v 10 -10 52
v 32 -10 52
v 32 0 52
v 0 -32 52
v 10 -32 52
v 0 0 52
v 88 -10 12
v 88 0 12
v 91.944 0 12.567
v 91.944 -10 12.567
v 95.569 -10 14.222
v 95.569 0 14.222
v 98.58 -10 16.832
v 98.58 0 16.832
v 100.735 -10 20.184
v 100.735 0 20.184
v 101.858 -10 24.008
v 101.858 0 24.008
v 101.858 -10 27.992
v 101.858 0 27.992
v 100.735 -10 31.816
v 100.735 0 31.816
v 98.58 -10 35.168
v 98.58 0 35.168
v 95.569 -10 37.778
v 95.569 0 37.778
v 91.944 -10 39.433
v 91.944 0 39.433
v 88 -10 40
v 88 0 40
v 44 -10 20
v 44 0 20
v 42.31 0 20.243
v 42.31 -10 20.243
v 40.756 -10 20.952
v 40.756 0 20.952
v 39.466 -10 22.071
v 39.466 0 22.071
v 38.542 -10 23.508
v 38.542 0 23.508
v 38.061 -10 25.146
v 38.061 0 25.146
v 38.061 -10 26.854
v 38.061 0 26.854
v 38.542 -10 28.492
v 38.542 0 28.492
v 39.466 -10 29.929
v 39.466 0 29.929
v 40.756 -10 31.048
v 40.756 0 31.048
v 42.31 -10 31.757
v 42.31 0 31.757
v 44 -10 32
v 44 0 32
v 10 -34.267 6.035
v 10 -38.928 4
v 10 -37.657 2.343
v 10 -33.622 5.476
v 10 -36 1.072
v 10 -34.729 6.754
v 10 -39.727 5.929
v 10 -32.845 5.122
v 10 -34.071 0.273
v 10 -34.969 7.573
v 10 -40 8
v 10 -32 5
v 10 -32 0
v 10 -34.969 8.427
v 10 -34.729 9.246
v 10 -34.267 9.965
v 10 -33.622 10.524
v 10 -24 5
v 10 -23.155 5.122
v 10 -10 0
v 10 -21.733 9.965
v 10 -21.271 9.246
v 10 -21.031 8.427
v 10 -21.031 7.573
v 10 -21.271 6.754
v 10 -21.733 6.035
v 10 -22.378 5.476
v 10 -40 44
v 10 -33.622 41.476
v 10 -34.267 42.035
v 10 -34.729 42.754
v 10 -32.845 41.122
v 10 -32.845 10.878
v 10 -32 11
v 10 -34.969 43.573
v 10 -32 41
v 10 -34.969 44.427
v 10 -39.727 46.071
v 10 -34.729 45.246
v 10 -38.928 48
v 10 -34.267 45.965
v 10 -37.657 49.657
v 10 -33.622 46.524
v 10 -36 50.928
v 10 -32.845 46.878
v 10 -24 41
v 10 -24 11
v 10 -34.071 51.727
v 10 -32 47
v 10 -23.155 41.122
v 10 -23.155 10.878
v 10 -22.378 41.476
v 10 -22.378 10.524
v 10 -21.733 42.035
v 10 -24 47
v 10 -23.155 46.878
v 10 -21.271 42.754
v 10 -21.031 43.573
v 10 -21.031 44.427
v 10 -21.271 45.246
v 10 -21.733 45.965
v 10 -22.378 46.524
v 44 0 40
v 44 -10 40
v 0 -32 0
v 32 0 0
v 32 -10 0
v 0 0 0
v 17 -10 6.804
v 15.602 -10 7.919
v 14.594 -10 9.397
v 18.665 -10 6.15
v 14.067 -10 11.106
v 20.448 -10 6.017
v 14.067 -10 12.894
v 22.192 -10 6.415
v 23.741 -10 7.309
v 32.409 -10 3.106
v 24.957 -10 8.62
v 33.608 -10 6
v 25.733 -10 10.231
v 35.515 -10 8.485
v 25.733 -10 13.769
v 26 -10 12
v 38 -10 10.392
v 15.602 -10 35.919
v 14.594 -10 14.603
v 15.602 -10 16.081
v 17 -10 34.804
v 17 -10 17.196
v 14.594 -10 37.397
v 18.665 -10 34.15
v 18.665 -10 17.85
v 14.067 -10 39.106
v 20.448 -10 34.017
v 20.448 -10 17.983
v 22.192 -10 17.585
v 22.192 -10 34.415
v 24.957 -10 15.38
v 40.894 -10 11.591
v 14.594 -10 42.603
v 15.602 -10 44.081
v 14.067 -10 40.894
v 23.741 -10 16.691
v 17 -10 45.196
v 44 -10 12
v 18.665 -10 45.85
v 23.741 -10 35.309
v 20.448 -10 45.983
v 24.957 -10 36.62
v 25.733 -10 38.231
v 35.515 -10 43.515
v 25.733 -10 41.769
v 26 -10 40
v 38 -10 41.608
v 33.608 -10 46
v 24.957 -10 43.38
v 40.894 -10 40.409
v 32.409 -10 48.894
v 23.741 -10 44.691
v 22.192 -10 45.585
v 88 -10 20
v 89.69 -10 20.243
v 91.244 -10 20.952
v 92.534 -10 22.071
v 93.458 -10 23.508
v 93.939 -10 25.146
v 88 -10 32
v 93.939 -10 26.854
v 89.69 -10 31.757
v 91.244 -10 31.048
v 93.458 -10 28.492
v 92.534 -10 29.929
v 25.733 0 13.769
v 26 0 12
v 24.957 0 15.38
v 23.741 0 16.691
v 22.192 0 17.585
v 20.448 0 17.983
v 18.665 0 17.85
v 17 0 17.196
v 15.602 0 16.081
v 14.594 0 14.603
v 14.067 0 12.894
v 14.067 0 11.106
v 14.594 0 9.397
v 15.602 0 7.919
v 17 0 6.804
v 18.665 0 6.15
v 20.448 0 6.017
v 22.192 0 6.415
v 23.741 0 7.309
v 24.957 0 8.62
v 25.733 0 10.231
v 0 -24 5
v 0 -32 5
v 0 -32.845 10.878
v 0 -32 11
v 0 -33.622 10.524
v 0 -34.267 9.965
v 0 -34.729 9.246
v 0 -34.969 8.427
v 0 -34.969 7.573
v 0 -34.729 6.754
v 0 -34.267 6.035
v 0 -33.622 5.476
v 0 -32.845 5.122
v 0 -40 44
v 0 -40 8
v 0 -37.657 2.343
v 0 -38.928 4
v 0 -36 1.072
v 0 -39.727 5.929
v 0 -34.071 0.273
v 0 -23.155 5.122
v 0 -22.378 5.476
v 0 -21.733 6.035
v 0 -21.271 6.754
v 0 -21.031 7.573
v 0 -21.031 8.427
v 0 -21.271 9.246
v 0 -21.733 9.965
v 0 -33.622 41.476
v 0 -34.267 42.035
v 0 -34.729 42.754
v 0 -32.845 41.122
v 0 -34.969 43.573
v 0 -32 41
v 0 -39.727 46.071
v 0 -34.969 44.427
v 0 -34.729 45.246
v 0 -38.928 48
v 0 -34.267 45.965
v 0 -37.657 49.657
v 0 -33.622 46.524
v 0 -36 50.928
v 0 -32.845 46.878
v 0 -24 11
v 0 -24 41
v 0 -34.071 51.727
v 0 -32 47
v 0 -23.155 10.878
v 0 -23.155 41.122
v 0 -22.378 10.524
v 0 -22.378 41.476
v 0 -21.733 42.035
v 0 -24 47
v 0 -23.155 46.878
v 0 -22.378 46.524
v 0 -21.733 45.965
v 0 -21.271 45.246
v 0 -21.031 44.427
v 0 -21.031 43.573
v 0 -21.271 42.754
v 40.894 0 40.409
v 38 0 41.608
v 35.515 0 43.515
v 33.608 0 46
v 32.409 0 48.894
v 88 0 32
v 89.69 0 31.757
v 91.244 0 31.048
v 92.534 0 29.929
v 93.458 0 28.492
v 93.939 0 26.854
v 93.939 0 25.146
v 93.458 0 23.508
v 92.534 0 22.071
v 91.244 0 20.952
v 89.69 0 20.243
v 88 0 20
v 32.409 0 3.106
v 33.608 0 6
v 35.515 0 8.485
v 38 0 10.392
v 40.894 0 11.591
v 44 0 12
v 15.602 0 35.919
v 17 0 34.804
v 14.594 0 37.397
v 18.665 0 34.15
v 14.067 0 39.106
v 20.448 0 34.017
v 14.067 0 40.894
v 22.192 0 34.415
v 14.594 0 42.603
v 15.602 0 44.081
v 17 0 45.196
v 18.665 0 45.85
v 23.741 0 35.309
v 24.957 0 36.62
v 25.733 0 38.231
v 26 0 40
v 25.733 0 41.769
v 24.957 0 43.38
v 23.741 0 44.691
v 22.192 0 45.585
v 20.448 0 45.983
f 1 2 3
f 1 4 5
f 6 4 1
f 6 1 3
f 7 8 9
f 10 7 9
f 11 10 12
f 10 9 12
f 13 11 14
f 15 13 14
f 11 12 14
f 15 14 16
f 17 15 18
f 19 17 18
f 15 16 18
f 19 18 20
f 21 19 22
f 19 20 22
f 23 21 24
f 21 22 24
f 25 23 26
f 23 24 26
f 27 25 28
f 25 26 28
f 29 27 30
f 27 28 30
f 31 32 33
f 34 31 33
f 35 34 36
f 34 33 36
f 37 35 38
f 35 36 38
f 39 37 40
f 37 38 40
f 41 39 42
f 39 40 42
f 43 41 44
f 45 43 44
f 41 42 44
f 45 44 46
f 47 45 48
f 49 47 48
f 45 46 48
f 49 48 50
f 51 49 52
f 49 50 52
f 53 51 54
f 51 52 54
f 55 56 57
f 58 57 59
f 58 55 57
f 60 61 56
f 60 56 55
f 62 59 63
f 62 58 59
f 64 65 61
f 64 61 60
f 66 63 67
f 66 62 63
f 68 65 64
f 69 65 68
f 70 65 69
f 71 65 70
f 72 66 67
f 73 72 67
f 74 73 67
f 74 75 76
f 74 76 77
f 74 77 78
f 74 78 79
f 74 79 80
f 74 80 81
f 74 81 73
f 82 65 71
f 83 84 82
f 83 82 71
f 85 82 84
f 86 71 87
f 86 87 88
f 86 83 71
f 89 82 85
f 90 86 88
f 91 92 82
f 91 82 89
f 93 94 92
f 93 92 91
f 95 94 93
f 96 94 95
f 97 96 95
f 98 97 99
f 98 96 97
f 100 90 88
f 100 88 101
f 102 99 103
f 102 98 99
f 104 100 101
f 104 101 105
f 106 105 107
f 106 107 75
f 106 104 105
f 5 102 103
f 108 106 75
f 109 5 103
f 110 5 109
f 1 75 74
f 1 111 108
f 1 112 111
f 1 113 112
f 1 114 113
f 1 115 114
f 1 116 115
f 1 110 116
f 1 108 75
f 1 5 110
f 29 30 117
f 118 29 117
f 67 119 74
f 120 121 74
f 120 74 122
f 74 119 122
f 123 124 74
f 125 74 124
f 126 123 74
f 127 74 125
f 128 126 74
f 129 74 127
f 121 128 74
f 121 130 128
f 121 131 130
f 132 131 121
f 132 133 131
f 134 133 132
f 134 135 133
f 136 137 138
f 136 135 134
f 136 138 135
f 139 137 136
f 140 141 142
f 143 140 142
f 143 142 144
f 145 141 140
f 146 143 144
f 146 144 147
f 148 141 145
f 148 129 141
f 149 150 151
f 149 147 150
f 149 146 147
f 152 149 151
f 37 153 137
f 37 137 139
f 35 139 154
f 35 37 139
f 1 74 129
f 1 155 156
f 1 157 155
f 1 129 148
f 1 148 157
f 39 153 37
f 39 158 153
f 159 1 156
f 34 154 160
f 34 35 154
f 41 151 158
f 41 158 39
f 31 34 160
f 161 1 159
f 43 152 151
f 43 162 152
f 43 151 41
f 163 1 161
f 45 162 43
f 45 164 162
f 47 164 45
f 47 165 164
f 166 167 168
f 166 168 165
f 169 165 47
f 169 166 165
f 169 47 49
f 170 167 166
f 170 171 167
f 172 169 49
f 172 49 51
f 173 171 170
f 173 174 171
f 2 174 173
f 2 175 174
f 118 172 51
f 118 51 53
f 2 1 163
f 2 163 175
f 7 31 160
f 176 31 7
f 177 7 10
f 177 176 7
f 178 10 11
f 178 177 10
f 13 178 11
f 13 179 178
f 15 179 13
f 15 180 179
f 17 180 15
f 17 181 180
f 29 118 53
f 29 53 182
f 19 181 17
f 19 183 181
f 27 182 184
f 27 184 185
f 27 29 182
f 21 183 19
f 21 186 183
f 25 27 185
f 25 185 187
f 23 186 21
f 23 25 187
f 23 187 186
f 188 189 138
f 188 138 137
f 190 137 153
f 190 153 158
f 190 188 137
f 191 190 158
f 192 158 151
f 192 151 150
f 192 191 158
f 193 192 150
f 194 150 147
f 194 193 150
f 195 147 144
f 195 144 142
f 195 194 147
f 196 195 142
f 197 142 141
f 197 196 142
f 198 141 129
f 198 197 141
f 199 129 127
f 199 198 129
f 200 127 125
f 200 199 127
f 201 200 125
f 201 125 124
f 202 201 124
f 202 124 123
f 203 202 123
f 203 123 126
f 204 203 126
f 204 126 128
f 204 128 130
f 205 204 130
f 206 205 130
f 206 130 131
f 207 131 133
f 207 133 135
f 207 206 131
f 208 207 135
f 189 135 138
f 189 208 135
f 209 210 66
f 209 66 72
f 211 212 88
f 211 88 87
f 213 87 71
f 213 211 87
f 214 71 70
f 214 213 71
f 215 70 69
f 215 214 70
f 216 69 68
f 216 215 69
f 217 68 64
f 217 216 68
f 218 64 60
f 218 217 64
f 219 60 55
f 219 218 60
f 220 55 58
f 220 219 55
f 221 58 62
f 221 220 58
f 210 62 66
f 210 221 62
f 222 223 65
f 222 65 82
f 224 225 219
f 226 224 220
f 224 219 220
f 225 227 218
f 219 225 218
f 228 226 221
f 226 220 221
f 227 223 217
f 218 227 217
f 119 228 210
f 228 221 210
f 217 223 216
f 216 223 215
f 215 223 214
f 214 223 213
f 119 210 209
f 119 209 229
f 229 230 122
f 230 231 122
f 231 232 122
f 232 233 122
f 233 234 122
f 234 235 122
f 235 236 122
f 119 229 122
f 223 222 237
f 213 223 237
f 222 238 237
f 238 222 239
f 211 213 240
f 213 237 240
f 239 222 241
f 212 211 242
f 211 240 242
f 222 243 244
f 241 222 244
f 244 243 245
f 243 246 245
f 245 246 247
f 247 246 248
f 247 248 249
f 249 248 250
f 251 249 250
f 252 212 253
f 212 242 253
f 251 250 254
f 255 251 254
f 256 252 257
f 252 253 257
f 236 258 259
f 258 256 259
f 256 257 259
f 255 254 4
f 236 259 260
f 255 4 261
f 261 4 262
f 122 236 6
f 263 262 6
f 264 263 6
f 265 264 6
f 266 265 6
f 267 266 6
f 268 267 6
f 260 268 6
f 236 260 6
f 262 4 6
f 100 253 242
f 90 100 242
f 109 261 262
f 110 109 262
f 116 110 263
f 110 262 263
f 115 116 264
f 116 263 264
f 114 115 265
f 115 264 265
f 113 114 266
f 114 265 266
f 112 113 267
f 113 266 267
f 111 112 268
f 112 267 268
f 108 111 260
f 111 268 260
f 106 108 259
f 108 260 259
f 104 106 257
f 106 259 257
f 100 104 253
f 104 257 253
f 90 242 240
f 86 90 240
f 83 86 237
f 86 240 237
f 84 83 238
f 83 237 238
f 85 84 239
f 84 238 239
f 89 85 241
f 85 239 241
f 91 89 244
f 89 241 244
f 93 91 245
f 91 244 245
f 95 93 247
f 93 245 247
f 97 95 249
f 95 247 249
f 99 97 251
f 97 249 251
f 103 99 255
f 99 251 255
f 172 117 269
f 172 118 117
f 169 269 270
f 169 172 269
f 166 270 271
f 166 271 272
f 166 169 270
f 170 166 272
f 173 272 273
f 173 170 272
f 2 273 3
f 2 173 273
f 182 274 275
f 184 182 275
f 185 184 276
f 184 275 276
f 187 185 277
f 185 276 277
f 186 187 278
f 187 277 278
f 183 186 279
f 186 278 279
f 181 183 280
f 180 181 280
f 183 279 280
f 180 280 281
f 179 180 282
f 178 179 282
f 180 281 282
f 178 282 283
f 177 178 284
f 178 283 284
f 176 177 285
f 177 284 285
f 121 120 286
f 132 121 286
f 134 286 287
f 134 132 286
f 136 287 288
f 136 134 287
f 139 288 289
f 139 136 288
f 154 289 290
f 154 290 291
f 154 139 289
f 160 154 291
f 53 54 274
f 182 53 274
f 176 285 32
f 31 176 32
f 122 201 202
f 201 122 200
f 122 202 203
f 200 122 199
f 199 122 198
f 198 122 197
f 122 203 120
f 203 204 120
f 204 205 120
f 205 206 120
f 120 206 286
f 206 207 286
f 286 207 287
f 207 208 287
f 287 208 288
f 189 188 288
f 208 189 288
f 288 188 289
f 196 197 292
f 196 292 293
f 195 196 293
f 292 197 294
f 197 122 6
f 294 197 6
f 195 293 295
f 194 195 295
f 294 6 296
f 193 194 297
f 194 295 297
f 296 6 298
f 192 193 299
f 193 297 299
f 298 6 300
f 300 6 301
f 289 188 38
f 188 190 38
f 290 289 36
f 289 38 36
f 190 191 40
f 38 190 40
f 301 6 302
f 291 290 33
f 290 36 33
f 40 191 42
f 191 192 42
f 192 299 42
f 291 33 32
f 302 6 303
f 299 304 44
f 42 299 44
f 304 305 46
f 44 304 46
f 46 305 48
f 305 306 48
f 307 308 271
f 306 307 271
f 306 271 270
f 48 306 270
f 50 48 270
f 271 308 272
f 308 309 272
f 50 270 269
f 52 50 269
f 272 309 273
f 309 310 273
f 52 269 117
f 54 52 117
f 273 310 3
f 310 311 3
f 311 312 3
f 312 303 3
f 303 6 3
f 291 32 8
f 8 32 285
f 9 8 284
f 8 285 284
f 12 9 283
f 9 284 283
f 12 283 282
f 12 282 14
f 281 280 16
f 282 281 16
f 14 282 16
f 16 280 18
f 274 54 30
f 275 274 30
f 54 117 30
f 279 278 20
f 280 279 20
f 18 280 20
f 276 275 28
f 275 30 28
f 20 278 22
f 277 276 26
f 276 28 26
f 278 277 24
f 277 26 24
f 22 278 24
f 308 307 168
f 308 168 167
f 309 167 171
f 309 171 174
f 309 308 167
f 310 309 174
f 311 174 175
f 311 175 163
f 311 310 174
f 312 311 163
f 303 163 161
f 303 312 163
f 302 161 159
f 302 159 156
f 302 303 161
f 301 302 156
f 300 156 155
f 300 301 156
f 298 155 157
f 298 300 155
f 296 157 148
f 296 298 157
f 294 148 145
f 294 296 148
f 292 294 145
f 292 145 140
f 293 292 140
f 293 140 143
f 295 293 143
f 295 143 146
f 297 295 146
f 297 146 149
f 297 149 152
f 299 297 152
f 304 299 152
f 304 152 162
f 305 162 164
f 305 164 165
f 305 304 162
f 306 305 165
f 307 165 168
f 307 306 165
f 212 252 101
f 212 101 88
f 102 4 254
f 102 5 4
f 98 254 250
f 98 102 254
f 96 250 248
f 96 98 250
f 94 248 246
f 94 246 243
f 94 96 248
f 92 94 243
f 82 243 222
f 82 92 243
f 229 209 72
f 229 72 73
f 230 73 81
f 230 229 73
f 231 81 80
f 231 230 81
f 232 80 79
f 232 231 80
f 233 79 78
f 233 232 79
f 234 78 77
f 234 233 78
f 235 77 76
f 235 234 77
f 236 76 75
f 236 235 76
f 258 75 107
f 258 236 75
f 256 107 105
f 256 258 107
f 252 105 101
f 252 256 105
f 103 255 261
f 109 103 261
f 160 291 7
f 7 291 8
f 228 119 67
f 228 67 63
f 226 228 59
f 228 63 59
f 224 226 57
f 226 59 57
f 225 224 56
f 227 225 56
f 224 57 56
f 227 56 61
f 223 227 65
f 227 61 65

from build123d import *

# Parameters (mm, degrees)
F0_R     = 6
F1_DEPTH = 10
F2_W     = 40
F2_H     = 52
F3_DEPTH = 10
F4_R     = 11.99999
F5_R     = 8
F7_DEPTH = 102.001


# Not quite as in the source:
# - a fillet or chamfer is up to 0.001 mm smaller than in the source, because OpenCascade refuses the exact size


with BuildPart() as f1:
    # F0 (on Front) → F1 (new body)
    with BuildSketch(Plane.XZ):
        with BuildLine():
            Line((32, 52), (0, 52))
            Line((0, 52), (0, 0))
            Line((0, 0), (32, 0))
            Line((32, 0), (32, 12))
            Line((32, 12), (88, 12))
            ThreePointArc((88, 12), (102, 26), (88, 40))
            Line((88, 40), (32, 40))
            Line((32, 40), (32, 52))
        make_face()
        with Locations((20, 12)):
            Circle(F0_R, mode=Mode.SUBTRACT)
        with Locations((20, 40)):
            Circle(F0_R, mode=Mode.SUBTRACT)
        with BuildLine():
            ThreePointArc((44, 20), (38, 26), (44, 32))
            Line((44, 32), (88, 32))
            ThreePointArc((88, 32), (94, 26), (88, 20))
            Line((88, 20), (44, 20))
        make_face(mode=Mode.SUBTRACT)
    extrude(amount=F1_DEPTH)

    # F2 (on Right) → F3 (join)
    with BuildSketch(Plane.YZ):
        with Locations((-20, 26)):
            Rectangle(F2_W, F2_H)
    extrude(amount=F3_DEPTH)

    # F4 (radius 12 in the source; OpenCascade refuses exactly that, so slightly less here)
    f4_edges = [f1.edges().sort_by_distance(p)[0] for p in [
        (32, -5, 40),
        (32, -5, 12),
    ]]
    fillet(f4_edges, radius=F4_R)

    # F5
    f5_edges = [f1.edges().sort_by_distance(p)[0] for p in [
        (5, -40, 0),
        (5, -40, 52),
    ]]
    fillet(f5_edges, radius=F5_R)

    # F6 (on Right) → F7 (cut, through all)
    with BuildSketch(Plane.YZ):
        with BuildLine():
            Line((-24, 11), (-32, 11))
            ThreePointArc((-32, 11), (-35, 8), (-32, 5))
            Line((-32, 5), (-24, 5))
            ThreePointArc((-24, 5), (-21, 8), (-24, 11))
        make_face()
    extrude(amount=F7_DEPTH, mode=Mode.SUBTRACT)

    # F9: F1 across plane


with BuildPart() as f1_1:
    add(f1.part)
    add(f1.part.mirror(Plane(origin=(11.5185185185, -11.5185185185, 26), x_dir=(1, 0, 0), z_dir=(0, 0, 1))), mode=Mode.INTERSECT)


solid = f1_1.part
